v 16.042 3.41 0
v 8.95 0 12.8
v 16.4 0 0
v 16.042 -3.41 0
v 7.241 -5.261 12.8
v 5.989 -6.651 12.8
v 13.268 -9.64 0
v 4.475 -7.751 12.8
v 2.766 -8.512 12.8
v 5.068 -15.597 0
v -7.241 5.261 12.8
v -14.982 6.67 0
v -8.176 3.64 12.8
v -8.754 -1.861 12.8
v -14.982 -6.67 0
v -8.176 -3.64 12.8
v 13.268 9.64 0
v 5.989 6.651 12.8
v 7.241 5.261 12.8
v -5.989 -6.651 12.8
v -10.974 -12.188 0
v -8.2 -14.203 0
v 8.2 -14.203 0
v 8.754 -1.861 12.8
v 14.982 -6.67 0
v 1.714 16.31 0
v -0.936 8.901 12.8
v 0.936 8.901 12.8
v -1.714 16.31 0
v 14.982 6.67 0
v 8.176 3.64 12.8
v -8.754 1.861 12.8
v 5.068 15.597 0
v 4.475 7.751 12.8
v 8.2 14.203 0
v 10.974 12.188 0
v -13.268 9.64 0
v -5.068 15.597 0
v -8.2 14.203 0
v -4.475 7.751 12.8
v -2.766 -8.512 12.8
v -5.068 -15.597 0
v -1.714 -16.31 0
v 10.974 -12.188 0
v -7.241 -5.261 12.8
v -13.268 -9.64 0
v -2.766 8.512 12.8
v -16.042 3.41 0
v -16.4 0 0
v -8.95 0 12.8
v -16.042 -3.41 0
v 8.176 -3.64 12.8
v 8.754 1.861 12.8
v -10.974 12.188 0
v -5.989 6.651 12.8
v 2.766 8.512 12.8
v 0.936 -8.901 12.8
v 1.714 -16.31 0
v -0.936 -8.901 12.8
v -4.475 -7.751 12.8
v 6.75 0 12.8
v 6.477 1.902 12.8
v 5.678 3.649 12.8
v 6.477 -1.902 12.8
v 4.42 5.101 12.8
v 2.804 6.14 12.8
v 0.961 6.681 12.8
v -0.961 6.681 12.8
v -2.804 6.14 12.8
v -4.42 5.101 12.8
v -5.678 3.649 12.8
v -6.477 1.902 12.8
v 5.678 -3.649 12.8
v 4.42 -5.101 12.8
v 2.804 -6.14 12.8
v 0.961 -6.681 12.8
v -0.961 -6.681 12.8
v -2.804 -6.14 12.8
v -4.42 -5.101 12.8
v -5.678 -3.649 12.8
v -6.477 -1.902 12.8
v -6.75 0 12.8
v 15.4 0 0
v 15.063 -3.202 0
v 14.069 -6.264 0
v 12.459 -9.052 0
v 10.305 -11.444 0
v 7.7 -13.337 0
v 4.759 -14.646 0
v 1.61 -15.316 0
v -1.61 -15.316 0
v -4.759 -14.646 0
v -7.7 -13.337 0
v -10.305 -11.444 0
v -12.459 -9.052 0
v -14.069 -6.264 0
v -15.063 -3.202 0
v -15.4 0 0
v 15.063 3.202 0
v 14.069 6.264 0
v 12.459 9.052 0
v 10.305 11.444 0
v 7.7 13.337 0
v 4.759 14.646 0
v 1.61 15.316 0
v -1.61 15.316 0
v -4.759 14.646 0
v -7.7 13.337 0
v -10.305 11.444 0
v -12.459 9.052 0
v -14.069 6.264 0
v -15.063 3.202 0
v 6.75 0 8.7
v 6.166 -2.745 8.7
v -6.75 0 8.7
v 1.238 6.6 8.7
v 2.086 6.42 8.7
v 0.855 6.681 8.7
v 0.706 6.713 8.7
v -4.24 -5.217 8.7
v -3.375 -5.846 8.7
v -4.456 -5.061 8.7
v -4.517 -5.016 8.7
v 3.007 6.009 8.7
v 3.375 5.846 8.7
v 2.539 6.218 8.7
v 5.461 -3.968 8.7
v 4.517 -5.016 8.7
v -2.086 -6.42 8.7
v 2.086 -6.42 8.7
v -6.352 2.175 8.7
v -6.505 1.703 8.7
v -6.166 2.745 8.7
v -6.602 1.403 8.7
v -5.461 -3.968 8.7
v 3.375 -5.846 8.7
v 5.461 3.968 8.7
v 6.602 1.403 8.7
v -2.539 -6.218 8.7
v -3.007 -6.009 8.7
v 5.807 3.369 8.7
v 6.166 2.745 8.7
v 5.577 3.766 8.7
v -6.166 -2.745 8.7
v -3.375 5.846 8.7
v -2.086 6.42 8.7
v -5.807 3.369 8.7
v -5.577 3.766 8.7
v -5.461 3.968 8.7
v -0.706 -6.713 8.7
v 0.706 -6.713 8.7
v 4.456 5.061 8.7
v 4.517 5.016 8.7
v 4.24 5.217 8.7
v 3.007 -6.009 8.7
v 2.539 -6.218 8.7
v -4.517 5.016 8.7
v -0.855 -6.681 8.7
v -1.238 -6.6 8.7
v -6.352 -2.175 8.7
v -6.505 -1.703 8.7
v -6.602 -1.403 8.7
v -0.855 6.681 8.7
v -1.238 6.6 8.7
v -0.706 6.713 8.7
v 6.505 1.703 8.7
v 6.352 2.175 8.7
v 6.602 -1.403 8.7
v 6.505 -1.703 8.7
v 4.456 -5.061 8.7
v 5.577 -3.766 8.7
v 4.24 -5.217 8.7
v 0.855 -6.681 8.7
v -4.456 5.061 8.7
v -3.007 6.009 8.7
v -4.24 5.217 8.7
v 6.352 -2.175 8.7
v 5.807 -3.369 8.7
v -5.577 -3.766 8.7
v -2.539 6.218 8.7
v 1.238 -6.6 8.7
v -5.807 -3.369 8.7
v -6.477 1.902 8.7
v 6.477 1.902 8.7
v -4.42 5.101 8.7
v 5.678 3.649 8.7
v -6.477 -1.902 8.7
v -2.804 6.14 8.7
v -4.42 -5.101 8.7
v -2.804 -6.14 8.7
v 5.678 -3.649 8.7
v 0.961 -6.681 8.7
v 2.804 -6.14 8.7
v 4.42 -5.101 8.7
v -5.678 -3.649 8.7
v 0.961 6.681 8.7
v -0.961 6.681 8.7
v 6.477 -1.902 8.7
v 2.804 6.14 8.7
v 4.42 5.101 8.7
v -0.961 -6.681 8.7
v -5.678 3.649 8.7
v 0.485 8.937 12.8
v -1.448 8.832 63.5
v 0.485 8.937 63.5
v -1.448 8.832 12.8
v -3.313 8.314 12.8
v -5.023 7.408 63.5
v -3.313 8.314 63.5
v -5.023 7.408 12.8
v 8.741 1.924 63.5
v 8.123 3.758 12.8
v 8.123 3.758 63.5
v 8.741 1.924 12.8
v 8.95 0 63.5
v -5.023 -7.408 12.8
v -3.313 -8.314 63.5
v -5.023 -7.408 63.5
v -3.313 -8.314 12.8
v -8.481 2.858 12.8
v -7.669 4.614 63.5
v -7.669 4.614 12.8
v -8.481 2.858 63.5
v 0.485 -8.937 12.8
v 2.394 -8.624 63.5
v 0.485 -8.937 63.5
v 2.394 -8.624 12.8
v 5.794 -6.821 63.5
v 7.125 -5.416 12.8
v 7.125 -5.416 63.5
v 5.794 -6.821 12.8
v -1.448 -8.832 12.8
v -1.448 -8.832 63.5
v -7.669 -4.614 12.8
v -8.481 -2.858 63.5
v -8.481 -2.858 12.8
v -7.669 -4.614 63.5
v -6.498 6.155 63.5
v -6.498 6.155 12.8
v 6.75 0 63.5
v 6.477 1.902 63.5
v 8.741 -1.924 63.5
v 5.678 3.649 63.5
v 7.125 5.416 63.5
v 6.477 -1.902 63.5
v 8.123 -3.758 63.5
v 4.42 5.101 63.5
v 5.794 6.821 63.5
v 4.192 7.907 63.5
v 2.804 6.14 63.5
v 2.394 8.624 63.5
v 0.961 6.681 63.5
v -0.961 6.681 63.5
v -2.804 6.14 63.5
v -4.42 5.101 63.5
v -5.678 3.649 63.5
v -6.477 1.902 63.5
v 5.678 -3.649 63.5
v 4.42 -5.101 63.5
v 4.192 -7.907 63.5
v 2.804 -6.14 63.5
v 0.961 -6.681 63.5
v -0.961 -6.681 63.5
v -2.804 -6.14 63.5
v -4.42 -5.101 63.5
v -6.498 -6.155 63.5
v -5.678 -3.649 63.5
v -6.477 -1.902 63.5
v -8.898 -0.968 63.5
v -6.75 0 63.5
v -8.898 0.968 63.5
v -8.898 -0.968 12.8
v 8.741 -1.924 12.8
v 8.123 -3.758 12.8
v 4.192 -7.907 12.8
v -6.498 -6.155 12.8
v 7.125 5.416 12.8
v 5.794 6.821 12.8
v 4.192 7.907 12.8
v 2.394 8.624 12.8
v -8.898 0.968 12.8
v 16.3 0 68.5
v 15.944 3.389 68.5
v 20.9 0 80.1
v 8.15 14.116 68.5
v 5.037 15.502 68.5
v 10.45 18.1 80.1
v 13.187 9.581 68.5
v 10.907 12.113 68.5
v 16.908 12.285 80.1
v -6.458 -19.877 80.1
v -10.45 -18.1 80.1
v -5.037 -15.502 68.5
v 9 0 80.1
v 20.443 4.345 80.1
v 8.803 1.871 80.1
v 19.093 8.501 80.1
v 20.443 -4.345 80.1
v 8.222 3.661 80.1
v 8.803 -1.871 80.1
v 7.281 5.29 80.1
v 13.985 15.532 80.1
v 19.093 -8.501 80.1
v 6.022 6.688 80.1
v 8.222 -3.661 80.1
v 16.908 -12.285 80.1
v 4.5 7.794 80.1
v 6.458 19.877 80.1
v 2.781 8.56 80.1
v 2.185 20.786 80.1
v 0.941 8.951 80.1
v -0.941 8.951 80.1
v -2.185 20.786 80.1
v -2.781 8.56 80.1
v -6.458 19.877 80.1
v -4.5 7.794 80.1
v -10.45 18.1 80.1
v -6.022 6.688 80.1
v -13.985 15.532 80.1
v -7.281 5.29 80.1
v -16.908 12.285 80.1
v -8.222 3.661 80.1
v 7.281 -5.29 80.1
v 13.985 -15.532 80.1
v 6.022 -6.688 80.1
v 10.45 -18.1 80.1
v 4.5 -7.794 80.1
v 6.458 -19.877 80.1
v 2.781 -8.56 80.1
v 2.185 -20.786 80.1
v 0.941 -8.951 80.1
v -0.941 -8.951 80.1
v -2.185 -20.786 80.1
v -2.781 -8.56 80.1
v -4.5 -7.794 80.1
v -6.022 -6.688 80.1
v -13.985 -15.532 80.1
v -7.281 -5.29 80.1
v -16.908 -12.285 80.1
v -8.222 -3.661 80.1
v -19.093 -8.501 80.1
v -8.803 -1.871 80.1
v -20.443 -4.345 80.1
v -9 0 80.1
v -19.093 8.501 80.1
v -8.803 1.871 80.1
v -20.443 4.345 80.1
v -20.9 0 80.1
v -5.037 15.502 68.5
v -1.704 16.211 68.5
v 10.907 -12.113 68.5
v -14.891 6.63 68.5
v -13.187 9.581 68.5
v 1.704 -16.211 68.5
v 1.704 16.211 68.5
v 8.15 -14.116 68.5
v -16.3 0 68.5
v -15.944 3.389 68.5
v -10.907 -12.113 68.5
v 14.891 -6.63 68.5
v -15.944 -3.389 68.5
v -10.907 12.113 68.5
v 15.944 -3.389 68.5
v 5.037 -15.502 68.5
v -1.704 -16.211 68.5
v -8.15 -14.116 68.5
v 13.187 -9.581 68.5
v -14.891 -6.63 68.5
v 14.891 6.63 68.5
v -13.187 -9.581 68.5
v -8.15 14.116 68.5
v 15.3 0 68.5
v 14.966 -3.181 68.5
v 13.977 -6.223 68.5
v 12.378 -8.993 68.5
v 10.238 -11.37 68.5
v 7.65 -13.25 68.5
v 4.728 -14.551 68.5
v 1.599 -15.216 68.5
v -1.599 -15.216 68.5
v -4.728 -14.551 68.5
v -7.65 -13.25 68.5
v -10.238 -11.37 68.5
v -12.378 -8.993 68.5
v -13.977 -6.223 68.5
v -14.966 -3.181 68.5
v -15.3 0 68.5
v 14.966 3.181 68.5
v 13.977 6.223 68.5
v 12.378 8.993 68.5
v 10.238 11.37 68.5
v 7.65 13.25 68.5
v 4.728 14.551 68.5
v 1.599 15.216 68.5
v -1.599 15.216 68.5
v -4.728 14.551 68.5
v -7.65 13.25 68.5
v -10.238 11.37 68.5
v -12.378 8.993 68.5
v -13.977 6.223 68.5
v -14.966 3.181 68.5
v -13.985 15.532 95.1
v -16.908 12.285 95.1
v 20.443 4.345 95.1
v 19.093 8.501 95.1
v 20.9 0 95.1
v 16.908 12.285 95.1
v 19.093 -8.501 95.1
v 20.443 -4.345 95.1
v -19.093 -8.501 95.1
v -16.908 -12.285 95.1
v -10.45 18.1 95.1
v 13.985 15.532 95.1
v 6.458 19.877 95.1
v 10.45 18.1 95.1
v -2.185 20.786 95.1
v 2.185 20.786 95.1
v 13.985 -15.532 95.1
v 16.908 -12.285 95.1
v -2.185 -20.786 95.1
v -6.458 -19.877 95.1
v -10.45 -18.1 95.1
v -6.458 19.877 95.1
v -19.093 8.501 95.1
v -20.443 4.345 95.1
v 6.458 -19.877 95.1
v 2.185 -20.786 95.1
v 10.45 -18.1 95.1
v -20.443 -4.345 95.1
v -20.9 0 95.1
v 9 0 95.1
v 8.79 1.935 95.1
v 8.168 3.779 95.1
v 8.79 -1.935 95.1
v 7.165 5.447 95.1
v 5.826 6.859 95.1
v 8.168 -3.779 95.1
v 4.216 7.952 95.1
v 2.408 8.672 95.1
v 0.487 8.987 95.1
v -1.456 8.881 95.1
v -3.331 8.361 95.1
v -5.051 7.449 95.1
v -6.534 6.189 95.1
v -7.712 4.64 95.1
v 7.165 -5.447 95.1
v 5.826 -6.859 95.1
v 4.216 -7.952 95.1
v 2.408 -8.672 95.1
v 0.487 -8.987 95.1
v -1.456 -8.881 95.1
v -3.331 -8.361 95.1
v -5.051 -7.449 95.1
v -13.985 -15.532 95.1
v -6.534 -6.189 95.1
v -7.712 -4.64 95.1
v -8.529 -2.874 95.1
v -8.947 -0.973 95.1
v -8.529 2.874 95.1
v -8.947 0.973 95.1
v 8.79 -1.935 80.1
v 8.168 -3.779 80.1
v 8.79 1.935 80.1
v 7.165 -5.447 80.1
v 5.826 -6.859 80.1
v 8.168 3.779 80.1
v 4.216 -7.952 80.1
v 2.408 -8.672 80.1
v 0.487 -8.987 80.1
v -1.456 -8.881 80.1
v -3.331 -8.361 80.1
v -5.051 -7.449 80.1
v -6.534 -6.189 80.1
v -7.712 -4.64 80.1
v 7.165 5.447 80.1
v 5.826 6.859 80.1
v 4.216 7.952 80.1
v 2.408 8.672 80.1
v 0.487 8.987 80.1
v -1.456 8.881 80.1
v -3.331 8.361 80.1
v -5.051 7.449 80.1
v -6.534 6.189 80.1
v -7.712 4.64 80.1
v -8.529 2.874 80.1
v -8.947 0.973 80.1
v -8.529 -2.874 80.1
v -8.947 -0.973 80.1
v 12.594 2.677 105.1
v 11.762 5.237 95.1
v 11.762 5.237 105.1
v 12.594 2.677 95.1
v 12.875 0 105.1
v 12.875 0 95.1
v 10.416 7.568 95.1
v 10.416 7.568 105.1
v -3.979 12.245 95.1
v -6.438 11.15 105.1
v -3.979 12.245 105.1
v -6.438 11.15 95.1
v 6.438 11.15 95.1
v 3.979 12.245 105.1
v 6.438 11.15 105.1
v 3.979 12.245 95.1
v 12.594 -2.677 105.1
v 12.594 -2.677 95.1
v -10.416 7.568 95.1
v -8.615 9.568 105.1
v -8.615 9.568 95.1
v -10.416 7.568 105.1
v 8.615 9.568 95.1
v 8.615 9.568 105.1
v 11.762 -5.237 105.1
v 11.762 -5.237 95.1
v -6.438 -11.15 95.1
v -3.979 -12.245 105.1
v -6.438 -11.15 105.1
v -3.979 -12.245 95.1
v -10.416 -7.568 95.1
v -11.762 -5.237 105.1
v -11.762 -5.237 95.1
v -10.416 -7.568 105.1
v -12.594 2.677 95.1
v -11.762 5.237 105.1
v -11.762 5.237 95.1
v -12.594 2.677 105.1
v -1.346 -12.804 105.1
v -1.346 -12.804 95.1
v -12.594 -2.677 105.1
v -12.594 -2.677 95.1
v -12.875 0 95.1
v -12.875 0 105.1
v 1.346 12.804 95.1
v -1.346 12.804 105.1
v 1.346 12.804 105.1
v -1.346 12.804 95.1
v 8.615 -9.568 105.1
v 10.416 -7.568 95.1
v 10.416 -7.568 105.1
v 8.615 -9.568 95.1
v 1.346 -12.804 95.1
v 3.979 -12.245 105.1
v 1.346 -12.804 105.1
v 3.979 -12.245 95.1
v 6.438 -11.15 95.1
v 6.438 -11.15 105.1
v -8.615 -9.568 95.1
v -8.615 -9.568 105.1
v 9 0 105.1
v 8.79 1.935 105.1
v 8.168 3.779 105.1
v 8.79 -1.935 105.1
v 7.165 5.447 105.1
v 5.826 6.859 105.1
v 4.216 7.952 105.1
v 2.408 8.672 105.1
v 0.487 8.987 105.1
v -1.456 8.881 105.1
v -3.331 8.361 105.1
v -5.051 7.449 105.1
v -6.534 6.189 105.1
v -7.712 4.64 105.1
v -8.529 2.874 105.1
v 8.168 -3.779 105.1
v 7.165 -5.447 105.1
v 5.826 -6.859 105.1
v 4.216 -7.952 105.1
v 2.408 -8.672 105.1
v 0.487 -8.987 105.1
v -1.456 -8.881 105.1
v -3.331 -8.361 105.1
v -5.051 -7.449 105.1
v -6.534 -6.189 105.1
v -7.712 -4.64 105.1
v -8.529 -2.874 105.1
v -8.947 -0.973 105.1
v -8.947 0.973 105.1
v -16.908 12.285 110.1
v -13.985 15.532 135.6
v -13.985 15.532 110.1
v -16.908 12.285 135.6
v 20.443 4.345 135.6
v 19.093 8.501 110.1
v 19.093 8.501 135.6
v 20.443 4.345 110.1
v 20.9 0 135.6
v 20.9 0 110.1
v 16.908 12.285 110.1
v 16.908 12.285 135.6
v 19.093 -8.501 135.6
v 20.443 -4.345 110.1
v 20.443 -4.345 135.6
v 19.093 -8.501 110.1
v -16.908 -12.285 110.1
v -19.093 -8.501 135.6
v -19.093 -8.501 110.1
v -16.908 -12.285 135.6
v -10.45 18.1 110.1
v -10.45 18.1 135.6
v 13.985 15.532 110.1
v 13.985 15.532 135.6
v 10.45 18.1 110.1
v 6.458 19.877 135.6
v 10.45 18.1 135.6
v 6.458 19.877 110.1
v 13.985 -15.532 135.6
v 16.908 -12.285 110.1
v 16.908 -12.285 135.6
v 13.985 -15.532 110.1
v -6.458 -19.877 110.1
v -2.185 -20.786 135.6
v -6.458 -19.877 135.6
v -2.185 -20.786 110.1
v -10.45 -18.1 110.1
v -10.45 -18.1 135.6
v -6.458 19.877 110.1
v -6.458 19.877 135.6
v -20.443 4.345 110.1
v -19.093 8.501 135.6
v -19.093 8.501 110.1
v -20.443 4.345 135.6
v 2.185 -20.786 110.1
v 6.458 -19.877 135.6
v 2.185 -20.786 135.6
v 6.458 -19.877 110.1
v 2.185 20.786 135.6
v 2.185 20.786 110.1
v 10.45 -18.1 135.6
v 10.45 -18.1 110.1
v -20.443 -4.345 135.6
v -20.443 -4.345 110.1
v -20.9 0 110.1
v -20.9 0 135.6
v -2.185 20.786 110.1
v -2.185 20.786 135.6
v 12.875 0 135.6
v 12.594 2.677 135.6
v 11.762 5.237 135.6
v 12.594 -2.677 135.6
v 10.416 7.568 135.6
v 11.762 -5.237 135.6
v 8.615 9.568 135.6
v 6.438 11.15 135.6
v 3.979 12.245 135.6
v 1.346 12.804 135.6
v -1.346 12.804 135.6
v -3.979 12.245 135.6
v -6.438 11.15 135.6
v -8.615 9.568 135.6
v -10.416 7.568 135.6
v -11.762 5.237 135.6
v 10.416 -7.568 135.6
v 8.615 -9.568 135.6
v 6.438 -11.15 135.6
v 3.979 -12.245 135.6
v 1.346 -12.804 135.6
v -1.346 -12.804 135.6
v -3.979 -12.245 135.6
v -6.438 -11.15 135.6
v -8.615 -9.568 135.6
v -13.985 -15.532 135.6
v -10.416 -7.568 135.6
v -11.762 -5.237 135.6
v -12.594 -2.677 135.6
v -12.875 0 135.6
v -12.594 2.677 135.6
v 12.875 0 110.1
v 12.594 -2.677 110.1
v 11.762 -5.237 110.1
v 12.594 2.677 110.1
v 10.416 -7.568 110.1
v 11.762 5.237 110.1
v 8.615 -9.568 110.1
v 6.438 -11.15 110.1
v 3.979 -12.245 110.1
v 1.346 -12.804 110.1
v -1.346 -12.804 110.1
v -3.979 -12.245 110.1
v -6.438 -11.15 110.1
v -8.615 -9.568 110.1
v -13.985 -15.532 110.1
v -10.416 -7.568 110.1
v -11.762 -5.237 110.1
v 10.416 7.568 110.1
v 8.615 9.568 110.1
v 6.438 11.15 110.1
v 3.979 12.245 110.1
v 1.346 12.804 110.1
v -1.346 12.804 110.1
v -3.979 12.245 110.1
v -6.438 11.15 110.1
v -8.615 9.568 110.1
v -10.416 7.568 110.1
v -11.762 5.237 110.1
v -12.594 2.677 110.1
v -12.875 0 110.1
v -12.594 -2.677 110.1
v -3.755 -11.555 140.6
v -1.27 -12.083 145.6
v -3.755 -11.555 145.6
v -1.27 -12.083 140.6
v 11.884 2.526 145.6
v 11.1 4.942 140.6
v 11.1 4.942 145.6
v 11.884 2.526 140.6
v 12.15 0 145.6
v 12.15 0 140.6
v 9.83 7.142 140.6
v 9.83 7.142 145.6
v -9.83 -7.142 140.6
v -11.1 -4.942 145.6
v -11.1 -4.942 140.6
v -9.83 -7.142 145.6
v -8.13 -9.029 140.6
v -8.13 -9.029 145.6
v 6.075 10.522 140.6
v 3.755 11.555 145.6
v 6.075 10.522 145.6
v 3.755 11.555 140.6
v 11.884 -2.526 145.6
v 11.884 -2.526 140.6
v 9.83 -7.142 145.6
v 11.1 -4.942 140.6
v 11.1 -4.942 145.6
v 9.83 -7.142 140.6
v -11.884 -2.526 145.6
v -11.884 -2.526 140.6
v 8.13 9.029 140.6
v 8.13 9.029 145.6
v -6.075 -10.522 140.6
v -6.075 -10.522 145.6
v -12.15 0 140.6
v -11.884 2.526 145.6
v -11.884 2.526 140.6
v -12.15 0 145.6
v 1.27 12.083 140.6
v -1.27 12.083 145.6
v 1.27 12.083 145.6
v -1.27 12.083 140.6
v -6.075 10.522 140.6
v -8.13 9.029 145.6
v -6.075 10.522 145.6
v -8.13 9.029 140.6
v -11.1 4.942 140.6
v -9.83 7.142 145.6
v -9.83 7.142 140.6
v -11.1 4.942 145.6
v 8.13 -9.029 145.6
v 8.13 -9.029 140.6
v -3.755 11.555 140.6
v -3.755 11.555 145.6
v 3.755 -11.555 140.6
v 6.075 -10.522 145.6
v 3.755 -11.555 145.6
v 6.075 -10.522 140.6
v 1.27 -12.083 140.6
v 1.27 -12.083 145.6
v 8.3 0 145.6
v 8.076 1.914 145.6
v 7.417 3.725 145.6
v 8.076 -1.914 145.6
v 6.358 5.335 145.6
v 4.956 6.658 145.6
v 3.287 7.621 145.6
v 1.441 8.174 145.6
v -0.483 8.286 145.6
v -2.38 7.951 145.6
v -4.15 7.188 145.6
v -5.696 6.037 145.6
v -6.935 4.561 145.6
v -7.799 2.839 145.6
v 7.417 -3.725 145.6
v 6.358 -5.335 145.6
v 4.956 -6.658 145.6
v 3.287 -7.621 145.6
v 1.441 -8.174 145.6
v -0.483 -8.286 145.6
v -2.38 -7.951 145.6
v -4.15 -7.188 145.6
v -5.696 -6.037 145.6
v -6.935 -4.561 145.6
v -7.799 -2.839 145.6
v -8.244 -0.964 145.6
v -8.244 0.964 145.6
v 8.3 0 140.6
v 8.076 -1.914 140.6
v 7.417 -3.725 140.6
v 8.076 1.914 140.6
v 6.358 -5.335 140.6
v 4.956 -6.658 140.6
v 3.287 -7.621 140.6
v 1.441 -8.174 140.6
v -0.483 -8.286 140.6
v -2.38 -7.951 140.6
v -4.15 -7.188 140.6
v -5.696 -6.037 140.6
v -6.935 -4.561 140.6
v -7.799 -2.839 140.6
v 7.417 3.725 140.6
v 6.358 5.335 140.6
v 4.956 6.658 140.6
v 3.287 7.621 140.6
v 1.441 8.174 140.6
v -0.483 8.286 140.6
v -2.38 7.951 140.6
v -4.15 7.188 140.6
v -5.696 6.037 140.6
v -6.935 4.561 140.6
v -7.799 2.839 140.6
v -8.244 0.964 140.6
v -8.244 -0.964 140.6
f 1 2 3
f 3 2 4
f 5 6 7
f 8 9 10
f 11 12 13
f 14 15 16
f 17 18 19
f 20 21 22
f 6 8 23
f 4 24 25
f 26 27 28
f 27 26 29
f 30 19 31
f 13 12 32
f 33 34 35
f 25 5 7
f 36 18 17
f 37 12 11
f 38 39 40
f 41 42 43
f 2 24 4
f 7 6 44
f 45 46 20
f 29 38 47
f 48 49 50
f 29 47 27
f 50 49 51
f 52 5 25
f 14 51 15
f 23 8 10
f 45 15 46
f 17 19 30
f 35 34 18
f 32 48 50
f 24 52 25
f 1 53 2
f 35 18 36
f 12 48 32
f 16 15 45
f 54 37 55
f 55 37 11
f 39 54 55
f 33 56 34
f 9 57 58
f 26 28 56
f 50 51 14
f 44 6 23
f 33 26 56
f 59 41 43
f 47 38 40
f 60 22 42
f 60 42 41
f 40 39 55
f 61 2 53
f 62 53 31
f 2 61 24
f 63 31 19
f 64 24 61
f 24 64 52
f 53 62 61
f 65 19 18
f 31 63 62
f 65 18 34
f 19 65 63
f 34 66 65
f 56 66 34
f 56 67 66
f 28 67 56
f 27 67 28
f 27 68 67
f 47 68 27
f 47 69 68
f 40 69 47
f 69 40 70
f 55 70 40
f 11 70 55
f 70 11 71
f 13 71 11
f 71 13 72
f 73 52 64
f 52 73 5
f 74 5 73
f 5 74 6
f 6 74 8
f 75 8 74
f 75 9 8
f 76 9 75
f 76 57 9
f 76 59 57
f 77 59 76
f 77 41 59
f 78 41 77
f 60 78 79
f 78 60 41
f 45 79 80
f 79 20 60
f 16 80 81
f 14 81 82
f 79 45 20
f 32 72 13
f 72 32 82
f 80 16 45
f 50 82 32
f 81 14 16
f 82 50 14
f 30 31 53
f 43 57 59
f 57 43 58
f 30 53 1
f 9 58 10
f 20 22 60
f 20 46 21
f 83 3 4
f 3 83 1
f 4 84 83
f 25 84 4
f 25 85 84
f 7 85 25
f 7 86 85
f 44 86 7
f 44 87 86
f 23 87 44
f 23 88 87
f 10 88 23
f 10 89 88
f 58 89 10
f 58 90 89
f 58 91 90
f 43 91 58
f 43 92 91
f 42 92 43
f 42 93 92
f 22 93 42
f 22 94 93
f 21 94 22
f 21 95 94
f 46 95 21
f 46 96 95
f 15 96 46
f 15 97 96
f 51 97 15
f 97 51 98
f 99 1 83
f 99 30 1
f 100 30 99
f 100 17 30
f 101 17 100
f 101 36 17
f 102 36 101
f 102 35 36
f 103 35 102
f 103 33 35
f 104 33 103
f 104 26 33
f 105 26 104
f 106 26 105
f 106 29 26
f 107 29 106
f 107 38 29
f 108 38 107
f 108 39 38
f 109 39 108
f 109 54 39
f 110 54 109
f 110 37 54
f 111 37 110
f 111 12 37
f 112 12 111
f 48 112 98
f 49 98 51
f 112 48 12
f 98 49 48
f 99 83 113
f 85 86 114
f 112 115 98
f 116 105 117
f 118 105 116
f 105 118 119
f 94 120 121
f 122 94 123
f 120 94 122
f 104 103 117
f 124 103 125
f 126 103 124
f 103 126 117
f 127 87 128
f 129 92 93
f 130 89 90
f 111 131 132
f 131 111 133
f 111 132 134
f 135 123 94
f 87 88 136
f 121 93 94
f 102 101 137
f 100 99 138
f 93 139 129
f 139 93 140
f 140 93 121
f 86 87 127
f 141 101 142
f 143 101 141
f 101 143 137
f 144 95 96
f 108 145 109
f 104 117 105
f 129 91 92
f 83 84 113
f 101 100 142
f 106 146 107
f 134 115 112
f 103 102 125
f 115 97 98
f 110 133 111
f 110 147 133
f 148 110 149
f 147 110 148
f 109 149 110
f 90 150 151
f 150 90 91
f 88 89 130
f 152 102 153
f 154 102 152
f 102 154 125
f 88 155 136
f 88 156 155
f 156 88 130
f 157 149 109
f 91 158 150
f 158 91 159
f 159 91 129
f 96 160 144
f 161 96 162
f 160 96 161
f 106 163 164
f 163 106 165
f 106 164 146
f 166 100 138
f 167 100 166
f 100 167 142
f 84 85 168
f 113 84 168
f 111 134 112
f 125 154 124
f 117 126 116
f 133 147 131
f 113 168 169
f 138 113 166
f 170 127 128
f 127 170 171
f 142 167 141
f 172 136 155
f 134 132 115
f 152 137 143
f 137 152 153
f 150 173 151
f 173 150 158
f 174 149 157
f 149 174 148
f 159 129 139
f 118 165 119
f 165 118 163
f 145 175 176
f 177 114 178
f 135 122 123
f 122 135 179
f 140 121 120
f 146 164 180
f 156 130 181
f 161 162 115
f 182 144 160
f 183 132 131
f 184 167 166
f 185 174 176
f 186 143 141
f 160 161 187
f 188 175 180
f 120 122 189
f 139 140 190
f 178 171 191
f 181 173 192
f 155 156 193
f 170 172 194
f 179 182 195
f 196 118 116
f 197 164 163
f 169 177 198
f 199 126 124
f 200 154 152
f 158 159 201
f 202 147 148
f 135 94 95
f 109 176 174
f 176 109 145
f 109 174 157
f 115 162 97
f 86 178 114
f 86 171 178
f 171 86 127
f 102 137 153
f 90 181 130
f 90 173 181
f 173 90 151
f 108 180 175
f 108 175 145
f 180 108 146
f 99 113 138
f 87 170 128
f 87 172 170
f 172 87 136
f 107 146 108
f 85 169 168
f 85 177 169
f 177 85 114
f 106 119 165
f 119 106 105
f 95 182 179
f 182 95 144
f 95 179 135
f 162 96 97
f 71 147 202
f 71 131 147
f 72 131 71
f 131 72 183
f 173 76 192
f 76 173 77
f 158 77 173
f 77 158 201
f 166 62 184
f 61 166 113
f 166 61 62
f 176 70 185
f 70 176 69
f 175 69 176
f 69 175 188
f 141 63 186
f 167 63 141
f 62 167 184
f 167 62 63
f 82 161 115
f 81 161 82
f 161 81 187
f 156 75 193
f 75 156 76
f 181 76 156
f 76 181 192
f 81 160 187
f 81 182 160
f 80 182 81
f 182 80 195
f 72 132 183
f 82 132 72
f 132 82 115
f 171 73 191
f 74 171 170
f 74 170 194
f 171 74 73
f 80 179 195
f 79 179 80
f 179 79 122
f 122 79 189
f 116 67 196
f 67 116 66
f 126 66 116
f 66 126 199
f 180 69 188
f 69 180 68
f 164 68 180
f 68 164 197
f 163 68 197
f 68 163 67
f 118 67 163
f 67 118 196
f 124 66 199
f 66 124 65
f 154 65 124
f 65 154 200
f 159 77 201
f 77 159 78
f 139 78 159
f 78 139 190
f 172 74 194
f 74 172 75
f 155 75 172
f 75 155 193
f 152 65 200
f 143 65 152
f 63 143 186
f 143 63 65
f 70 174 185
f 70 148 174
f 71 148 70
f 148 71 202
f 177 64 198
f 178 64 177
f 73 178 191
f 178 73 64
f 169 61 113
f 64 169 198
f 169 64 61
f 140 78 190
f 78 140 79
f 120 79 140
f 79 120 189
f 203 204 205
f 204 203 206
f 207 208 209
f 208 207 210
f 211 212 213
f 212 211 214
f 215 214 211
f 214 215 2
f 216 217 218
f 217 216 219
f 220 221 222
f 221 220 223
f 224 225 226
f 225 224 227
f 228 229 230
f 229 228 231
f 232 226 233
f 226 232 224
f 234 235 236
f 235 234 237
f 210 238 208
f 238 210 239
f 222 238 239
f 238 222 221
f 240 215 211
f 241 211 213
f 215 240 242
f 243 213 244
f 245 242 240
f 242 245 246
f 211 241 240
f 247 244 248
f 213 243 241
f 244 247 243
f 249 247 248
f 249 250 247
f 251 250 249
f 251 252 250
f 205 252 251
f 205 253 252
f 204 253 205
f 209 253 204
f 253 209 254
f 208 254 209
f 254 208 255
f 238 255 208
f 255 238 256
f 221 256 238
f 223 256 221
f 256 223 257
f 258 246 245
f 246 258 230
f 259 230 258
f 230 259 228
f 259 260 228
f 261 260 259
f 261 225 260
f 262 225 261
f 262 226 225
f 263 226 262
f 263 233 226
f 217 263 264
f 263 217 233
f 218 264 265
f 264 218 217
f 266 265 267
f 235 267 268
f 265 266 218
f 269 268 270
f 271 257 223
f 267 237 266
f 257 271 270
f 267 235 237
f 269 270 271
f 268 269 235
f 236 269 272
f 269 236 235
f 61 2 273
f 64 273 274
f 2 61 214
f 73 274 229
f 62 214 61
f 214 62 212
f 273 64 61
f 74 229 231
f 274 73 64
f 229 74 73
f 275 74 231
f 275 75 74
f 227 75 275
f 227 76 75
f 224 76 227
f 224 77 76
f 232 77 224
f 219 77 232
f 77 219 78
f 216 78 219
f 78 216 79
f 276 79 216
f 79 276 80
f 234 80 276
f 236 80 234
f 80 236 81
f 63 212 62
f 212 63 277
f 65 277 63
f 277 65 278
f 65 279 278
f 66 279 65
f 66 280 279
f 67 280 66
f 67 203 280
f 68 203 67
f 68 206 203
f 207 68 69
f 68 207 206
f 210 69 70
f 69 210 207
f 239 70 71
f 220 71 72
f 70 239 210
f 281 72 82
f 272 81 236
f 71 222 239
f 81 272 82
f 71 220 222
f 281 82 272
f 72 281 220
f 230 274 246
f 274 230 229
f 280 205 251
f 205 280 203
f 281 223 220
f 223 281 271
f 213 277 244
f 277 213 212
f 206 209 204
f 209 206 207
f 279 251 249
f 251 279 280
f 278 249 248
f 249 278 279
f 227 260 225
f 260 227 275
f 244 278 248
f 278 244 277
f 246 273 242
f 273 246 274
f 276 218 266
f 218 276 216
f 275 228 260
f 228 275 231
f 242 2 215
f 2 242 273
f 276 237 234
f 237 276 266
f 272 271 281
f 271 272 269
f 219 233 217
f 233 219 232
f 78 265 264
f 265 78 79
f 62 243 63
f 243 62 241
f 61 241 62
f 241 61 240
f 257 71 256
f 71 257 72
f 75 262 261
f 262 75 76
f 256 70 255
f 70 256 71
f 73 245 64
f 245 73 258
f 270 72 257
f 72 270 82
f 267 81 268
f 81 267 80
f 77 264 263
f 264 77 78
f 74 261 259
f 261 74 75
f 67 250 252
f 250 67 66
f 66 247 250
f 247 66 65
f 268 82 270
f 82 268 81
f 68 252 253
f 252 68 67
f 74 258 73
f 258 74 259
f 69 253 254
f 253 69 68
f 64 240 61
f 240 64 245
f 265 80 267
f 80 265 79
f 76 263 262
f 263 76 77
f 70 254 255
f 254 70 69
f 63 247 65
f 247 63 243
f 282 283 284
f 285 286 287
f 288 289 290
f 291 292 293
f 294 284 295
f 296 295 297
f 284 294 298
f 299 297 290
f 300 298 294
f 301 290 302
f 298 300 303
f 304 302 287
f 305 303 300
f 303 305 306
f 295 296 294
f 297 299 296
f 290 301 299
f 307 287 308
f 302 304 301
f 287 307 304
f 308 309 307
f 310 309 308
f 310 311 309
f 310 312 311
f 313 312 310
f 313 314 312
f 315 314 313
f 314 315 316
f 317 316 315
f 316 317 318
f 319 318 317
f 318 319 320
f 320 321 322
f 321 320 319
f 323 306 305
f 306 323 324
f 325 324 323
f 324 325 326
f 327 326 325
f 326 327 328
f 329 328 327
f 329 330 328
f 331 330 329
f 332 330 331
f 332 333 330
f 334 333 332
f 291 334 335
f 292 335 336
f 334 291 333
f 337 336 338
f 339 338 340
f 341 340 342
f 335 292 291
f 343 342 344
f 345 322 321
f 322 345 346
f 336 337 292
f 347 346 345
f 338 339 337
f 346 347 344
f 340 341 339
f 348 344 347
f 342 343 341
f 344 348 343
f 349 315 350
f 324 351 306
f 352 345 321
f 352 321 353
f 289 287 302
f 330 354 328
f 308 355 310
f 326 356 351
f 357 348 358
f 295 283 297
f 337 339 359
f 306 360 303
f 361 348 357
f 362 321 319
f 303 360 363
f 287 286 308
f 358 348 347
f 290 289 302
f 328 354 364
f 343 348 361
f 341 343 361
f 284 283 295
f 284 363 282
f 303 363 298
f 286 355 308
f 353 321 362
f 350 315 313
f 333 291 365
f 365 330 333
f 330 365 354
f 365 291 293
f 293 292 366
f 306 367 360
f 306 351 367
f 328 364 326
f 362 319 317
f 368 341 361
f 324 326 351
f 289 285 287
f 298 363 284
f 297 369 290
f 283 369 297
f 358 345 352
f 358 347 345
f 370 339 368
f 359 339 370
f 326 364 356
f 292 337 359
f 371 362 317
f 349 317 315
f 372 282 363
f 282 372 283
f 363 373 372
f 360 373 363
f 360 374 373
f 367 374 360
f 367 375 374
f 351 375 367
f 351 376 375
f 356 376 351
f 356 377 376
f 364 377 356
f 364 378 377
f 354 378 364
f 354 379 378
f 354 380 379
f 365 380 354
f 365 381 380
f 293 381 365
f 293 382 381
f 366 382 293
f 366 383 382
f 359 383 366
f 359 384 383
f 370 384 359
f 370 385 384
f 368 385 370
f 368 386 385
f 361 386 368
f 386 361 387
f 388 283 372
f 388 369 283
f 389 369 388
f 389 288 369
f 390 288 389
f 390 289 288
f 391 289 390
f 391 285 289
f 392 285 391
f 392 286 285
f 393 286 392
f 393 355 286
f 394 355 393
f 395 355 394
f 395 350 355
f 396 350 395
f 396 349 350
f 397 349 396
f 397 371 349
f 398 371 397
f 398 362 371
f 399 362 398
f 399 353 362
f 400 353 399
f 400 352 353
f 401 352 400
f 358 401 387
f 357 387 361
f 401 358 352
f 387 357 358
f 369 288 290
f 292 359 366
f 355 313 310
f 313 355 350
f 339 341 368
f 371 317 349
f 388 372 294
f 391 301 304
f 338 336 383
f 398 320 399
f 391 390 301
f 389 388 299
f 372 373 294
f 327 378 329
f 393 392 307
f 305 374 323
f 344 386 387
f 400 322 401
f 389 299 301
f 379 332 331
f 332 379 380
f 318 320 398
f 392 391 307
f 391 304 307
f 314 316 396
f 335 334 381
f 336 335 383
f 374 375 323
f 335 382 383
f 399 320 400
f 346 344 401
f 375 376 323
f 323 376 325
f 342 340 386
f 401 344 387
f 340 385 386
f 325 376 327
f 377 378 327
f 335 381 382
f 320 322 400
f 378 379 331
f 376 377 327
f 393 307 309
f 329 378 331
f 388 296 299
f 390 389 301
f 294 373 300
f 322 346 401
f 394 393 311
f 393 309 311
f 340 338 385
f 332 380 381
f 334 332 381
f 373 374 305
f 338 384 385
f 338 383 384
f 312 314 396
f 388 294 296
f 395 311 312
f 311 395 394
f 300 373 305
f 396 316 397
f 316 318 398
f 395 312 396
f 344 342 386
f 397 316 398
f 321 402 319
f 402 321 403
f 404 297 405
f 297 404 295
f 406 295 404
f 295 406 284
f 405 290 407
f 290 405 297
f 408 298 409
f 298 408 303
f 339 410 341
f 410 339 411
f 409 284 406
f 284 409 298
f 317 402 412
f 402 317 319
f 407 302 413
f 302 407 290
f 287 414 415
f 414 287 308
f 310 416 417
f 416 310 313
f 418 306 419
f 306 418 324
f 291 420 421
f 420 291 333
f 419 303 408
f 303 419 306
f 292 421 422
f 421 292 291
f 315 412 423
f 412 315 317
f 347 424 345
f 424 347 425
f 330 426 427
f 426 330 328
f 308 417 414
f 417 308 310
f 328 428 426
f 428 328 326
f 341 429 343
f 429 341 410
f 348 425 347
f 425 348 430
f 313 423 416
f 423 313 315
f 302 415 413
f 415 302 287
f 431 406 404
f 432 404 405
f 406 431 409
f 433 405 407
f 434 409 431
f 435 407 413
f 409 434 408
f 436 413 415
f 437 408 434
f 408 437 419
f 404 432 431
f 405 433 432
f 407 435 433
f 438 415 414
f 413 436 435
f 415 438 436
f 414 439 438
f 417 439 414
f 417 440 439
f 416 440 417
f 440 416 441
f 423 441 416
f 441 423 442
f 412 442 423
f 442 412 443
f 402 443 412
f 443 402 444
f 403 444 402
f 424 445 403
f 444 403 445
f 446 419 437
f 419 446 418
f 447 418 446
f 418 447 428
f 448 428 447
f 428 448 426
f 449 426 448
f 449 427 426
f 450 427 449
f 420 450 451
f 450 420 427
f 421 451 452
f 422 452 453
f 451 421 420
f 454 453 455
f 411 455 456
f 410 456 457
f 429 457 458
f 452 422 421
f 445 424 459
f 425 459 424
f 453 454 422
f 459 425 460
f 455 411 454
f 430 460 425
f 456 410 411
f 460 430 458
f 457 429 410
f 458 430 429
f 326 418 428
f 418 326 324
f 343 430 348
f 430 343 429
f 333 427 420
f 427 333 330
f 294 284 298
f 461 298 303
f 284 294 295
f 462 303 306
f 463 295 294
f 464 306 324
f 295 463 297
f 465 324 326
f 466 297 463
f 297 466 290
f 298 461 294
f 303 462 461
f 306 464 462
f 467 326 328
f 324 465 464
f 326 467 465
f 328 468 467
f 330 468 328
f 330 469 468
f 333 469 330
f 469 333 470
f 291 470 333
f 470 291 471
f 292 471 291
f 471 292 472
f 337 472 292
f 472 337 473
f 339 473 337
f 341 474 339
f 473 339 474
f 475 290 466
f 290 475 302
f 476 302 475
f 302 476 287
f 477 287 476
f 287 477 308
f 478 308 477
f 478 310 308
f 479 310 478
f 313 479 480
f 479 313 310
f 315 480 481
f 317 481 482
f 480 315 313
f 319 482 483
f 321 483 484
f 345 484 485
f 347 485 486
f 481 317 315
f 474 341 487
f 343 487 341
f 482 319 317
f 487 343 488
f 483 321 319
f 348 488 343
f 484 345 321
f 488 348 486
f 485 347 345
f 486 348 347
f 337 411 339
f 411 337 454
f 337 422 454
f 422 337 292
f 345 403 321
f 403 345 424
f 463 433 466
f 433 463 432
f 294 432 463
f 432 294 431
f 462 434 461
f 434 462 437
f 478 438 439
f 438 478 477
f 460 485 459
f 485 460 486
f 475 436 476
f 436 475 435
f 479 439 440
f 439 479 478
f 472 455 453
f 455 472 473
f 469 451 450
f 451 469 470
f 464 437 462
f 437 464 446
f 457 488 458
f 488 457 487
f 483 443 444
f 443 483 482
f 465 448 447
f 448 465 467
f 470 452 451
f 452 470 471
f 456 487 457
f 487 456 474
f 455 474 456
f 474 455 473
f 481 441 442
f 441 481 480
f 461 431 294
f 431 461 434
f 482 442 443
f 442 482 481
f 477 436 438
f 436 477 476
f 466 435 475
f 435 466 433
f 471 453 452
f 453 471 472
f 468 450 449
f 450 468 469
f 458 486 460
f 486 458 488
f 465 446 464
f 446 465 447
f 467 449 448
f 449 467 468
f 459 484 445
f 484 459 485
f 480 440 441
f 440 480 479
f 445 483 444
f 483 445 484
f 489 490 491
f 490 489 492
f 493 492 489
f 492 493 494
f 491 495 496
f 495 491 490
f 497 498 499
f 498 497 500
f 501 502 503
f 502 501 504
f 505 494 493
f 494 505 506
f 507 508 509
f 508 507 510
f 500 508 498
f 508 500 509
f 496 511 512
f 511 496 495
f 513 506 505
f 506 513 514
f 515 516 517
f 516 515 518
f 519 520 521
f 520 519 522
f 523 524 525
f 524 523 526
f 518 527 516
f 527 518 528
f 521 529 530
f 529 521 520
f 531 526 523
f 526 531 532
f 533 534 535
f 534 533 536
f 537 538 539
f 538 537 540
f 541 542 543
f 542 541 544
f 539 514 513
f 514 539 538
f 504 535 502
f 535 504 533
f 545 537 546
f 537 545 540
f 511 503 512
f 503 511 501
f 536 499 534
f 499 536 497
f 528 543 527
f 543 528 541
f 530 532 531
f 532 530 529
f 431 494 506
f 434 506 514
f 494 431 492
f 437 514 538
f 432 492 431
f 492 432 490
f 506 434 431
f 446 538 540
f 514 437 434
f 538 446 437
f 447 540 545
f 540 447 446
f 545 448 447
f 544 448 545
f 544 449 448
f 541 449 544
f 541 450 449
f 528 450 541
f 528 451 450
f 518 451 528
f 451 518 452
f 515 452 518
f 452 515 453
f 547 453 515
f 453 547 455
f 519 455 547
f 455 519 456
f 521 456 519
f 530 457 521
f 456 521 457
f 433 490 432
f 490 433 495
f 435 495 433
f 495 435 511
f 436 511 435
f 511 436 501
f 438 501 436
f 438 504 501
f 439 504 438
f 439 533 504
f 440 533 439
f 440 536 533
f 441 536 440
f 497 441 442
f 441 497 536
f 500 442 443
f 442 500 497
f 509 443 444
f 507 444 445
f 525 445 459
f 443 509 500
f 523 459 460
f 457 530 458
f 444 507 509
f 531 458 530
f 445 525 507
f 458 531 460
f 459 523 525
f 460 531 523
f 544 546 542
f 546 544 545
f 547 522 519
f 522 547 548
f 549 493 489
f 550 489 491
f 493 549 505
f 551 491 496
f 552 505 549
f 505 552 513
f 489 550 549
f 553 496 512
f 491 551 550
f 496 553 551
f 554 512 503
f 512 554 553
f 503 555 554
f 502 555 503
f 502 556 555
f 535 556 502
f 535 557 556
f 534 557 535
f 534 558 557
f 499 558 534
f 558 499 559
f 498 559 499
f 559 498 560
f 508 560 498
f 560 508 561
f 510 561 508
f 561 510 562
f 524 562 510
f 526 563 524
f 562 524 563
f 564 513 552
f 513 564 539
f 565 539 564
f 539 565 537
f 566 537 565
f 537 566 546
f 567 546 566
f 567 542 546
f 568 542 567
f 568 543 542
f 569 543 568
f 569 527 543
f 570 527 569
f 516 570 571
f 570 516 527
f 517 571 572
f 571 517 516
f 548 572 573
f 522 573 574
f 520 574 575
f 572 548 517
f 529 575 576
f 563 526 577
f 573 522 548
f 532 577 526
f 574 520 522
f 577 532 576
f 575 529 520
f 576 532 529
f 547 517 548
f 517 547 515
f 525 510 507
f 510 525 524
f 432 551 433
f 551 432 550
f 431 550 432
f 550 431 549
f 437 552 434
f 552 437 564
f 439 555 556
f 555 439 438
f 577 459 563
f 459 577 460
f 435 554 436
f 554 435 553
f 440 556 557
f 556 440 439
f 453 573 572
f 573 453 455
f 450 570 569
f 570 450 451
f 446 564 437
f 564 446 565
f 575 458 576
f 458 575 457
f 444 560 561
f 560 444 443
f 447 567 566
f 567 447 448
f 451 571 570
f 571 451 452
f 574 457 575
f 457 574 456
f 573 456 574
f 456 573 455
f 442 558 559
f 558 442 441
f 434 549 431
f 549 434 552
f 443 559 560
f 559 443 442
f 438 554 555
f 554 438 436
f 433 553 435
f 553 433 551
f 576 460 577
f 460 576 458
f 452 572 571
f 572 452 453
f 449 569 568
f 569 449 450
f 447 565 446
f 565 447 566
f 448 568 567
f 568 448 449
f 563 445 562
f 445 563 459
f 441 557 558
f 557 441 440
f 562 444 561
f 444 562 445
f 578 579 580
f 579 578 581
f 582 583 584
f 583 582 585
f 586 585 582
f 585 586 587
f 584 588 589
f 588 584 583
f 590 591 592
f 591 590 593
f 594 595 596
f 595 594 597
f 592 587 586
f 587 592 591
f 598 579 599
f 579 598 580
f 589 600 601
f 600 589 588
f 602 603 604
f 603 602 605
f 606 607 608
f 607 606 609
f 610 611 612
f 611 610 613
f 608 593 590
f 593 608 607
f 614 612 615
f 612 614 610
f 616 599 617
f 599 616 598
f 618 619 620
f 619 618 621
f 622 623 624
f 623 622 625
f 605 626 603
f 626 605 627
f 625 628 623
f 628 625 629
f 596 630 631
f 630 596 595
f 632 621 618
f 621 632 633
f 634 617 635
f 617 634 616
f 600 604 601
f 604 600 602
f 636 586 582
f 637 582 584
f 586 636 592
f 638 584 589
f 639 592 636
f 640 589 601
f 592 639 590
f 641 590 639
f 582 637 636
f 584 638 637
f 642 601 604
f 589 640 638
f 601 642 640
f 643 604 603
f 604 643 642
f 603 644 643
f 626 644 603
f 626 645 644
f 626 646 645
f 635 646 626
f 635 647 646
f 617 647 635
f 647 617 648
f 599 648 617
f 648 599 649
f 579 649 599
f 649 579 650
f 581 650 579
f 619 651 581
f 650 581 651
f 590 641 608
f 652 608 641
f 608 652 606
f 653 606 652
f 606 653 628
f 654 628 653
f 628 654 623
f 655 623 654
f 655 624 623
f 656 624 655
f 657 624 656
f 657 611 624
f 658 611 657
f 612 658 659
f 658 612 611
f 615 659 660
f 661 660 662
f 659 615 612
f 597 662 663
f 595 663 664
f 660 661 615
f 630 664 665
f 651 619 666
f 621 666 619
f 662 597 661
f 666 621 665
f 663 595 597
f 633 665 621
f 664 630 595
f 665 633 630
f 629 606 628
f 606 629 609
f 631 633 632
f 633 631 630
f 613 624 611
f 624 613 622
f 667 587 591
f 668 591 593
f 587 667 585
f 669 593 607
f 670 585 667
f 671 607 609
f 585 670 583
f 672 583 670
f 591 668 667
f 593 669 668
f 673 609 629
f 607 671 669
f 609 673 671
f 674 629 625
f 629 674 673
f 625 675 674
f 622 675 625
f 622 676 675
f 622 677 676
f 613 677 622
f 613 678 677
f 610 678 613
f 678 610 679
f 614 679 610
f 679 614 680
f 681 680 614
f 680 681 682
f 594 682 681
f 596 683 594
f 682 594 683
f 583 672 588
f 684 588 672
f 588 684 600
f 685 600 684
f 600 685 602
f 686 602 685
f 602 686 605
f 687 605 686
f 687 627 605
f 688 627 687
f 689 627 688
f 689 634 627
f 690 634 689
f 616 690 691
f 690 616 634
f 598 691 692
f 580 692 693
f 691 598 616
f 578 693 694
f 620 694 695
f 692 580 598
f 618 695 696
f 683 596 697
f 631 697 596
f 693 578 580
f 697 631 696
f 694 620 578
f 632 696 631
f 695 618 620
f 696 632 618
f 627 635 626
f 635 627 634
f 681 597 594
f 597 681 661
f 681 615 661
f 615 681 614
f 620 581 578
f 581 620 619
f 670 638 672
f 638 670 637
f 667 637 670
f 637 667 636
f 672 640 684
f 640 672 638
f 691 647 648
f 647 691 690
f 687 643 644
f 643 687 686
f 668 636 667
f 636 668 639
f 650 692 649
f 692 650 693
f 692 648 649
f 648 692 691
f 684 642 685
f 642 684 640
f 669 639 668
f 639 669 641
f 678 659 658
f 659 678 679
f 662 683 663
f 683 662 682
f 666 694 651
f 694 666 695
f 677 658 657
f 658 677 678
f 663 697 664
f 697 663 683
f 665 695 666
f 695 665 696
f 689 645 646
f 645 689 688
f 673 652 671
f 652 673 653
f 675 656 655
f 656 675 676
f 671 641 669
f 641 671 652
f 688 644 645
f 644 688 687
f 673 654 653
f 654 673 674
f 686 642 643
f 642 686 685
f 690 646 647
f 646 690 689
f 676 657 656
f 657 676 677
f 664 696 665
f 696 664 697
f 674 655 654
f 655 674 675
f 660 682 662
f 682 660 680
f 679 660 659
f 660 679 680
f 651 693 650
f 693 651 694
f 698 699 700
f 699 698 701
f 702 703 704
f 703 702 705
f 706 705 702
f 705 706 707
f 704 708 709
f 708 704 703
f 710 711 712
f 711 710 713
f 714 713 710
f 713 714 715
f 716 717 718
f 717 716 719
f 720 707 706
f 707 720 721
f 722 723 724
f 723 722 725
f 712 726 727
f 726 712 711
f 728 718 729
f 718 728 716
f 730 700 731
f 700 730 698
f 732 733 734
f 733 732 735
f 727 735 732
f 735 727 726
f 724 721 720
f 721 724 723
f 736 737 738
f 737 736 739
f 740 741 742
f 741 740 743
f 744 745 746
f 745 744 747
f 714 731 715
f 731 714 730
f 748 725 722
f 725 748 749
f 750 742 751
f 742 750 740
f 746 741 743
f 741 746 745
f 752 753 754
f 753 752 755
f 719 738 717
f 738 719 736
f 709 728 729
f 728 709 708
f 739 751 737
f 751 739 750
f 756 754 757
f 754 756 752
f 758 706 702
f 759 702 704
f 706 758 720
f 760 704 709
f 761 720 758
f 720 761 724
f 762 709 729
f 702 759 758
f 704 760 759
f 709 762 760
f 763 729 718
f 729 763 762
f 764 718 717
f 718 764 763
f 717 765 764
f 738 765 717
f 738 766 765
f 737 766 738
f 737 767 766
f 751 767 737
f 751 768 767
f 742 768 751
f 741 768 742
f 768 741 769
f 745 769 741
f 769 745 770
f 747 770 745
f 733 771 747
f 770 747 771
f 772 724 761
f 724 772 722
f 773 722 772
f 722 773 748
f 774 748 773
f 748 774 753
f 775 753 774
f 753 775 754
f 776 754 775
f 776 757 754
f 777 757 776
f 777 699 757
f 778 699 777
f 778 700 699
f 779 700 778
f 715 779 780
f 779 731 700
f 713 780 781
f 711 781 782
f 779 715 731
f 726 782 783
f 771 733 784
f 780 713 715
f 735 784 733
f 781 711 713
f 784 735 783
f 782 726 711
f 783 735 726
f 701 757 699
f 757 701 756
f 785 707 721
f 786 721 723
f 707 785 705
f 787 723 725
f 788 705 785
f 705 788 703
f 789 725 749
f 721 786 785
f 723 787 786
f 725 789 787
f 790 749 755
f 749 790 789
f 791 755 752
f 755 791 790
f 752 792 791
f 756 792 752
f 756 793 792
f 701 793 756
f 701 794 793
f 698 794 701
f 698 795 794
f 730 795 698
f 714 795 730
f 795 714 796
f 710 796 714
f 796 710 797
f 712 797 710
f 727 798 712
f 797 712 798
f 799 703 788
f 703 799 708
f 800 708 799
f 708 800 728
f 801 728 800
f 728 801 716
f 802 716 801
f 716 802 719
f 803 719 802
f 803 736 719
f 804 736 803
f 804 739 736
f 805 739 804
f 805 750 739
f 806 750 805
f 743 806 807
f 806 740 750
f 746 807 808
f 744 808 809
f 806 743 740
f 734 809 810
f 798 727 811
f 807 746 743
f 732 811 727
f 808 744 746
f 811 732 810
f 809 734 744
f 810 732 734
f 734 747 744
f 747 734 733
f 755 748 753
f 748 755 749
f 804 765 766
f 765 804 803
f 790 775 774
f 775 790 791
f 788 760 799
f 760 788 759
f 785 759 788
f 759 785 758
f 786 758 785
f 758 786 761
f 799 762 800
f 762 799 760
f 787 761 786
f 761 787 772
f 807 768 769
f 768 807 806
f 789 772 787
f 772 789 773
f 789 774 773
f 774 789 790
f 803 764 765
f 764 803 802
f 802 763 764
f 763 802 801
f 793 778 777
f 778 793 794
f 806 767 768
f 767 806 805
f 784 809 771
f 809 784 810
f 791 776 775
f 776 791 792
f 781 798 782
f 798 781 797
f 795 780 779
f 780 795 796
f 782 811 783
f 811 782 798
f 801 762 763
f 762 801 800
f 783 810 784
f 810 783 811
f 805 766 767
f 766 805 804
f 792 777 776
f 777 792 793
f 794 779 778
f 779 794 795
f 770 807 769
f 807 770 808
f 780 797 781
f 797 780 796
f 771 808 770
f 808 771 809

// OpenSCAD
// Part 1, funnel

union() {
	difference() { 	
		cylinder(h = 12.8, r1 = 16.4, r2 = 8.95);		
		cylinder(h = 8.7, r1 = 15.4, r2 = 6.75);
		translate([0, 0, 8.7])
		cylinder(h = 7.5, r = 6.75);
	}
	translate([0, 0, 12.8])
	difference() { 
		cylinder(h = 50.7, r = 8.95);		
		cylinder(h = 50.7, r = 6.75);
	}
}


// Part 2, cap

translate([0, 0, 68.5])
union() {
//base
	difference() {
		cylinder(h = 11.6, r1 = 16.3, r2 = 20.9); // r1 = 32.6, r2 = 41.8
		cylinder(h = 11.6, r1 = 15.3, r2 = 9); // r1 = 30.6, r2 = 18
	}
	translate([0, 0, 11.6])
	difference() {
		cylinder(h = 15, r = 20.9);
		cylinder(h = 15, r = 9);
	}
	translate([0, 0, 26.6])
	difference() {
		cylinder(h = 10, r = 12.875);
		cylinder(h = 10, r = 9);
	}
}


// Part 3, ring 1

translate([0, 0, 110.1])
difference() {
	cylinder(h = 25.5, r = 20.9);
	cylinder(h = 25.5, r = 12.875);
}

// Part 4, ring 2

translate([0, 0, 140.6])
difference() {
	cylinder(h = 5, r = 12.15);
	cylinder(h = 5, r = 8.3);
}
